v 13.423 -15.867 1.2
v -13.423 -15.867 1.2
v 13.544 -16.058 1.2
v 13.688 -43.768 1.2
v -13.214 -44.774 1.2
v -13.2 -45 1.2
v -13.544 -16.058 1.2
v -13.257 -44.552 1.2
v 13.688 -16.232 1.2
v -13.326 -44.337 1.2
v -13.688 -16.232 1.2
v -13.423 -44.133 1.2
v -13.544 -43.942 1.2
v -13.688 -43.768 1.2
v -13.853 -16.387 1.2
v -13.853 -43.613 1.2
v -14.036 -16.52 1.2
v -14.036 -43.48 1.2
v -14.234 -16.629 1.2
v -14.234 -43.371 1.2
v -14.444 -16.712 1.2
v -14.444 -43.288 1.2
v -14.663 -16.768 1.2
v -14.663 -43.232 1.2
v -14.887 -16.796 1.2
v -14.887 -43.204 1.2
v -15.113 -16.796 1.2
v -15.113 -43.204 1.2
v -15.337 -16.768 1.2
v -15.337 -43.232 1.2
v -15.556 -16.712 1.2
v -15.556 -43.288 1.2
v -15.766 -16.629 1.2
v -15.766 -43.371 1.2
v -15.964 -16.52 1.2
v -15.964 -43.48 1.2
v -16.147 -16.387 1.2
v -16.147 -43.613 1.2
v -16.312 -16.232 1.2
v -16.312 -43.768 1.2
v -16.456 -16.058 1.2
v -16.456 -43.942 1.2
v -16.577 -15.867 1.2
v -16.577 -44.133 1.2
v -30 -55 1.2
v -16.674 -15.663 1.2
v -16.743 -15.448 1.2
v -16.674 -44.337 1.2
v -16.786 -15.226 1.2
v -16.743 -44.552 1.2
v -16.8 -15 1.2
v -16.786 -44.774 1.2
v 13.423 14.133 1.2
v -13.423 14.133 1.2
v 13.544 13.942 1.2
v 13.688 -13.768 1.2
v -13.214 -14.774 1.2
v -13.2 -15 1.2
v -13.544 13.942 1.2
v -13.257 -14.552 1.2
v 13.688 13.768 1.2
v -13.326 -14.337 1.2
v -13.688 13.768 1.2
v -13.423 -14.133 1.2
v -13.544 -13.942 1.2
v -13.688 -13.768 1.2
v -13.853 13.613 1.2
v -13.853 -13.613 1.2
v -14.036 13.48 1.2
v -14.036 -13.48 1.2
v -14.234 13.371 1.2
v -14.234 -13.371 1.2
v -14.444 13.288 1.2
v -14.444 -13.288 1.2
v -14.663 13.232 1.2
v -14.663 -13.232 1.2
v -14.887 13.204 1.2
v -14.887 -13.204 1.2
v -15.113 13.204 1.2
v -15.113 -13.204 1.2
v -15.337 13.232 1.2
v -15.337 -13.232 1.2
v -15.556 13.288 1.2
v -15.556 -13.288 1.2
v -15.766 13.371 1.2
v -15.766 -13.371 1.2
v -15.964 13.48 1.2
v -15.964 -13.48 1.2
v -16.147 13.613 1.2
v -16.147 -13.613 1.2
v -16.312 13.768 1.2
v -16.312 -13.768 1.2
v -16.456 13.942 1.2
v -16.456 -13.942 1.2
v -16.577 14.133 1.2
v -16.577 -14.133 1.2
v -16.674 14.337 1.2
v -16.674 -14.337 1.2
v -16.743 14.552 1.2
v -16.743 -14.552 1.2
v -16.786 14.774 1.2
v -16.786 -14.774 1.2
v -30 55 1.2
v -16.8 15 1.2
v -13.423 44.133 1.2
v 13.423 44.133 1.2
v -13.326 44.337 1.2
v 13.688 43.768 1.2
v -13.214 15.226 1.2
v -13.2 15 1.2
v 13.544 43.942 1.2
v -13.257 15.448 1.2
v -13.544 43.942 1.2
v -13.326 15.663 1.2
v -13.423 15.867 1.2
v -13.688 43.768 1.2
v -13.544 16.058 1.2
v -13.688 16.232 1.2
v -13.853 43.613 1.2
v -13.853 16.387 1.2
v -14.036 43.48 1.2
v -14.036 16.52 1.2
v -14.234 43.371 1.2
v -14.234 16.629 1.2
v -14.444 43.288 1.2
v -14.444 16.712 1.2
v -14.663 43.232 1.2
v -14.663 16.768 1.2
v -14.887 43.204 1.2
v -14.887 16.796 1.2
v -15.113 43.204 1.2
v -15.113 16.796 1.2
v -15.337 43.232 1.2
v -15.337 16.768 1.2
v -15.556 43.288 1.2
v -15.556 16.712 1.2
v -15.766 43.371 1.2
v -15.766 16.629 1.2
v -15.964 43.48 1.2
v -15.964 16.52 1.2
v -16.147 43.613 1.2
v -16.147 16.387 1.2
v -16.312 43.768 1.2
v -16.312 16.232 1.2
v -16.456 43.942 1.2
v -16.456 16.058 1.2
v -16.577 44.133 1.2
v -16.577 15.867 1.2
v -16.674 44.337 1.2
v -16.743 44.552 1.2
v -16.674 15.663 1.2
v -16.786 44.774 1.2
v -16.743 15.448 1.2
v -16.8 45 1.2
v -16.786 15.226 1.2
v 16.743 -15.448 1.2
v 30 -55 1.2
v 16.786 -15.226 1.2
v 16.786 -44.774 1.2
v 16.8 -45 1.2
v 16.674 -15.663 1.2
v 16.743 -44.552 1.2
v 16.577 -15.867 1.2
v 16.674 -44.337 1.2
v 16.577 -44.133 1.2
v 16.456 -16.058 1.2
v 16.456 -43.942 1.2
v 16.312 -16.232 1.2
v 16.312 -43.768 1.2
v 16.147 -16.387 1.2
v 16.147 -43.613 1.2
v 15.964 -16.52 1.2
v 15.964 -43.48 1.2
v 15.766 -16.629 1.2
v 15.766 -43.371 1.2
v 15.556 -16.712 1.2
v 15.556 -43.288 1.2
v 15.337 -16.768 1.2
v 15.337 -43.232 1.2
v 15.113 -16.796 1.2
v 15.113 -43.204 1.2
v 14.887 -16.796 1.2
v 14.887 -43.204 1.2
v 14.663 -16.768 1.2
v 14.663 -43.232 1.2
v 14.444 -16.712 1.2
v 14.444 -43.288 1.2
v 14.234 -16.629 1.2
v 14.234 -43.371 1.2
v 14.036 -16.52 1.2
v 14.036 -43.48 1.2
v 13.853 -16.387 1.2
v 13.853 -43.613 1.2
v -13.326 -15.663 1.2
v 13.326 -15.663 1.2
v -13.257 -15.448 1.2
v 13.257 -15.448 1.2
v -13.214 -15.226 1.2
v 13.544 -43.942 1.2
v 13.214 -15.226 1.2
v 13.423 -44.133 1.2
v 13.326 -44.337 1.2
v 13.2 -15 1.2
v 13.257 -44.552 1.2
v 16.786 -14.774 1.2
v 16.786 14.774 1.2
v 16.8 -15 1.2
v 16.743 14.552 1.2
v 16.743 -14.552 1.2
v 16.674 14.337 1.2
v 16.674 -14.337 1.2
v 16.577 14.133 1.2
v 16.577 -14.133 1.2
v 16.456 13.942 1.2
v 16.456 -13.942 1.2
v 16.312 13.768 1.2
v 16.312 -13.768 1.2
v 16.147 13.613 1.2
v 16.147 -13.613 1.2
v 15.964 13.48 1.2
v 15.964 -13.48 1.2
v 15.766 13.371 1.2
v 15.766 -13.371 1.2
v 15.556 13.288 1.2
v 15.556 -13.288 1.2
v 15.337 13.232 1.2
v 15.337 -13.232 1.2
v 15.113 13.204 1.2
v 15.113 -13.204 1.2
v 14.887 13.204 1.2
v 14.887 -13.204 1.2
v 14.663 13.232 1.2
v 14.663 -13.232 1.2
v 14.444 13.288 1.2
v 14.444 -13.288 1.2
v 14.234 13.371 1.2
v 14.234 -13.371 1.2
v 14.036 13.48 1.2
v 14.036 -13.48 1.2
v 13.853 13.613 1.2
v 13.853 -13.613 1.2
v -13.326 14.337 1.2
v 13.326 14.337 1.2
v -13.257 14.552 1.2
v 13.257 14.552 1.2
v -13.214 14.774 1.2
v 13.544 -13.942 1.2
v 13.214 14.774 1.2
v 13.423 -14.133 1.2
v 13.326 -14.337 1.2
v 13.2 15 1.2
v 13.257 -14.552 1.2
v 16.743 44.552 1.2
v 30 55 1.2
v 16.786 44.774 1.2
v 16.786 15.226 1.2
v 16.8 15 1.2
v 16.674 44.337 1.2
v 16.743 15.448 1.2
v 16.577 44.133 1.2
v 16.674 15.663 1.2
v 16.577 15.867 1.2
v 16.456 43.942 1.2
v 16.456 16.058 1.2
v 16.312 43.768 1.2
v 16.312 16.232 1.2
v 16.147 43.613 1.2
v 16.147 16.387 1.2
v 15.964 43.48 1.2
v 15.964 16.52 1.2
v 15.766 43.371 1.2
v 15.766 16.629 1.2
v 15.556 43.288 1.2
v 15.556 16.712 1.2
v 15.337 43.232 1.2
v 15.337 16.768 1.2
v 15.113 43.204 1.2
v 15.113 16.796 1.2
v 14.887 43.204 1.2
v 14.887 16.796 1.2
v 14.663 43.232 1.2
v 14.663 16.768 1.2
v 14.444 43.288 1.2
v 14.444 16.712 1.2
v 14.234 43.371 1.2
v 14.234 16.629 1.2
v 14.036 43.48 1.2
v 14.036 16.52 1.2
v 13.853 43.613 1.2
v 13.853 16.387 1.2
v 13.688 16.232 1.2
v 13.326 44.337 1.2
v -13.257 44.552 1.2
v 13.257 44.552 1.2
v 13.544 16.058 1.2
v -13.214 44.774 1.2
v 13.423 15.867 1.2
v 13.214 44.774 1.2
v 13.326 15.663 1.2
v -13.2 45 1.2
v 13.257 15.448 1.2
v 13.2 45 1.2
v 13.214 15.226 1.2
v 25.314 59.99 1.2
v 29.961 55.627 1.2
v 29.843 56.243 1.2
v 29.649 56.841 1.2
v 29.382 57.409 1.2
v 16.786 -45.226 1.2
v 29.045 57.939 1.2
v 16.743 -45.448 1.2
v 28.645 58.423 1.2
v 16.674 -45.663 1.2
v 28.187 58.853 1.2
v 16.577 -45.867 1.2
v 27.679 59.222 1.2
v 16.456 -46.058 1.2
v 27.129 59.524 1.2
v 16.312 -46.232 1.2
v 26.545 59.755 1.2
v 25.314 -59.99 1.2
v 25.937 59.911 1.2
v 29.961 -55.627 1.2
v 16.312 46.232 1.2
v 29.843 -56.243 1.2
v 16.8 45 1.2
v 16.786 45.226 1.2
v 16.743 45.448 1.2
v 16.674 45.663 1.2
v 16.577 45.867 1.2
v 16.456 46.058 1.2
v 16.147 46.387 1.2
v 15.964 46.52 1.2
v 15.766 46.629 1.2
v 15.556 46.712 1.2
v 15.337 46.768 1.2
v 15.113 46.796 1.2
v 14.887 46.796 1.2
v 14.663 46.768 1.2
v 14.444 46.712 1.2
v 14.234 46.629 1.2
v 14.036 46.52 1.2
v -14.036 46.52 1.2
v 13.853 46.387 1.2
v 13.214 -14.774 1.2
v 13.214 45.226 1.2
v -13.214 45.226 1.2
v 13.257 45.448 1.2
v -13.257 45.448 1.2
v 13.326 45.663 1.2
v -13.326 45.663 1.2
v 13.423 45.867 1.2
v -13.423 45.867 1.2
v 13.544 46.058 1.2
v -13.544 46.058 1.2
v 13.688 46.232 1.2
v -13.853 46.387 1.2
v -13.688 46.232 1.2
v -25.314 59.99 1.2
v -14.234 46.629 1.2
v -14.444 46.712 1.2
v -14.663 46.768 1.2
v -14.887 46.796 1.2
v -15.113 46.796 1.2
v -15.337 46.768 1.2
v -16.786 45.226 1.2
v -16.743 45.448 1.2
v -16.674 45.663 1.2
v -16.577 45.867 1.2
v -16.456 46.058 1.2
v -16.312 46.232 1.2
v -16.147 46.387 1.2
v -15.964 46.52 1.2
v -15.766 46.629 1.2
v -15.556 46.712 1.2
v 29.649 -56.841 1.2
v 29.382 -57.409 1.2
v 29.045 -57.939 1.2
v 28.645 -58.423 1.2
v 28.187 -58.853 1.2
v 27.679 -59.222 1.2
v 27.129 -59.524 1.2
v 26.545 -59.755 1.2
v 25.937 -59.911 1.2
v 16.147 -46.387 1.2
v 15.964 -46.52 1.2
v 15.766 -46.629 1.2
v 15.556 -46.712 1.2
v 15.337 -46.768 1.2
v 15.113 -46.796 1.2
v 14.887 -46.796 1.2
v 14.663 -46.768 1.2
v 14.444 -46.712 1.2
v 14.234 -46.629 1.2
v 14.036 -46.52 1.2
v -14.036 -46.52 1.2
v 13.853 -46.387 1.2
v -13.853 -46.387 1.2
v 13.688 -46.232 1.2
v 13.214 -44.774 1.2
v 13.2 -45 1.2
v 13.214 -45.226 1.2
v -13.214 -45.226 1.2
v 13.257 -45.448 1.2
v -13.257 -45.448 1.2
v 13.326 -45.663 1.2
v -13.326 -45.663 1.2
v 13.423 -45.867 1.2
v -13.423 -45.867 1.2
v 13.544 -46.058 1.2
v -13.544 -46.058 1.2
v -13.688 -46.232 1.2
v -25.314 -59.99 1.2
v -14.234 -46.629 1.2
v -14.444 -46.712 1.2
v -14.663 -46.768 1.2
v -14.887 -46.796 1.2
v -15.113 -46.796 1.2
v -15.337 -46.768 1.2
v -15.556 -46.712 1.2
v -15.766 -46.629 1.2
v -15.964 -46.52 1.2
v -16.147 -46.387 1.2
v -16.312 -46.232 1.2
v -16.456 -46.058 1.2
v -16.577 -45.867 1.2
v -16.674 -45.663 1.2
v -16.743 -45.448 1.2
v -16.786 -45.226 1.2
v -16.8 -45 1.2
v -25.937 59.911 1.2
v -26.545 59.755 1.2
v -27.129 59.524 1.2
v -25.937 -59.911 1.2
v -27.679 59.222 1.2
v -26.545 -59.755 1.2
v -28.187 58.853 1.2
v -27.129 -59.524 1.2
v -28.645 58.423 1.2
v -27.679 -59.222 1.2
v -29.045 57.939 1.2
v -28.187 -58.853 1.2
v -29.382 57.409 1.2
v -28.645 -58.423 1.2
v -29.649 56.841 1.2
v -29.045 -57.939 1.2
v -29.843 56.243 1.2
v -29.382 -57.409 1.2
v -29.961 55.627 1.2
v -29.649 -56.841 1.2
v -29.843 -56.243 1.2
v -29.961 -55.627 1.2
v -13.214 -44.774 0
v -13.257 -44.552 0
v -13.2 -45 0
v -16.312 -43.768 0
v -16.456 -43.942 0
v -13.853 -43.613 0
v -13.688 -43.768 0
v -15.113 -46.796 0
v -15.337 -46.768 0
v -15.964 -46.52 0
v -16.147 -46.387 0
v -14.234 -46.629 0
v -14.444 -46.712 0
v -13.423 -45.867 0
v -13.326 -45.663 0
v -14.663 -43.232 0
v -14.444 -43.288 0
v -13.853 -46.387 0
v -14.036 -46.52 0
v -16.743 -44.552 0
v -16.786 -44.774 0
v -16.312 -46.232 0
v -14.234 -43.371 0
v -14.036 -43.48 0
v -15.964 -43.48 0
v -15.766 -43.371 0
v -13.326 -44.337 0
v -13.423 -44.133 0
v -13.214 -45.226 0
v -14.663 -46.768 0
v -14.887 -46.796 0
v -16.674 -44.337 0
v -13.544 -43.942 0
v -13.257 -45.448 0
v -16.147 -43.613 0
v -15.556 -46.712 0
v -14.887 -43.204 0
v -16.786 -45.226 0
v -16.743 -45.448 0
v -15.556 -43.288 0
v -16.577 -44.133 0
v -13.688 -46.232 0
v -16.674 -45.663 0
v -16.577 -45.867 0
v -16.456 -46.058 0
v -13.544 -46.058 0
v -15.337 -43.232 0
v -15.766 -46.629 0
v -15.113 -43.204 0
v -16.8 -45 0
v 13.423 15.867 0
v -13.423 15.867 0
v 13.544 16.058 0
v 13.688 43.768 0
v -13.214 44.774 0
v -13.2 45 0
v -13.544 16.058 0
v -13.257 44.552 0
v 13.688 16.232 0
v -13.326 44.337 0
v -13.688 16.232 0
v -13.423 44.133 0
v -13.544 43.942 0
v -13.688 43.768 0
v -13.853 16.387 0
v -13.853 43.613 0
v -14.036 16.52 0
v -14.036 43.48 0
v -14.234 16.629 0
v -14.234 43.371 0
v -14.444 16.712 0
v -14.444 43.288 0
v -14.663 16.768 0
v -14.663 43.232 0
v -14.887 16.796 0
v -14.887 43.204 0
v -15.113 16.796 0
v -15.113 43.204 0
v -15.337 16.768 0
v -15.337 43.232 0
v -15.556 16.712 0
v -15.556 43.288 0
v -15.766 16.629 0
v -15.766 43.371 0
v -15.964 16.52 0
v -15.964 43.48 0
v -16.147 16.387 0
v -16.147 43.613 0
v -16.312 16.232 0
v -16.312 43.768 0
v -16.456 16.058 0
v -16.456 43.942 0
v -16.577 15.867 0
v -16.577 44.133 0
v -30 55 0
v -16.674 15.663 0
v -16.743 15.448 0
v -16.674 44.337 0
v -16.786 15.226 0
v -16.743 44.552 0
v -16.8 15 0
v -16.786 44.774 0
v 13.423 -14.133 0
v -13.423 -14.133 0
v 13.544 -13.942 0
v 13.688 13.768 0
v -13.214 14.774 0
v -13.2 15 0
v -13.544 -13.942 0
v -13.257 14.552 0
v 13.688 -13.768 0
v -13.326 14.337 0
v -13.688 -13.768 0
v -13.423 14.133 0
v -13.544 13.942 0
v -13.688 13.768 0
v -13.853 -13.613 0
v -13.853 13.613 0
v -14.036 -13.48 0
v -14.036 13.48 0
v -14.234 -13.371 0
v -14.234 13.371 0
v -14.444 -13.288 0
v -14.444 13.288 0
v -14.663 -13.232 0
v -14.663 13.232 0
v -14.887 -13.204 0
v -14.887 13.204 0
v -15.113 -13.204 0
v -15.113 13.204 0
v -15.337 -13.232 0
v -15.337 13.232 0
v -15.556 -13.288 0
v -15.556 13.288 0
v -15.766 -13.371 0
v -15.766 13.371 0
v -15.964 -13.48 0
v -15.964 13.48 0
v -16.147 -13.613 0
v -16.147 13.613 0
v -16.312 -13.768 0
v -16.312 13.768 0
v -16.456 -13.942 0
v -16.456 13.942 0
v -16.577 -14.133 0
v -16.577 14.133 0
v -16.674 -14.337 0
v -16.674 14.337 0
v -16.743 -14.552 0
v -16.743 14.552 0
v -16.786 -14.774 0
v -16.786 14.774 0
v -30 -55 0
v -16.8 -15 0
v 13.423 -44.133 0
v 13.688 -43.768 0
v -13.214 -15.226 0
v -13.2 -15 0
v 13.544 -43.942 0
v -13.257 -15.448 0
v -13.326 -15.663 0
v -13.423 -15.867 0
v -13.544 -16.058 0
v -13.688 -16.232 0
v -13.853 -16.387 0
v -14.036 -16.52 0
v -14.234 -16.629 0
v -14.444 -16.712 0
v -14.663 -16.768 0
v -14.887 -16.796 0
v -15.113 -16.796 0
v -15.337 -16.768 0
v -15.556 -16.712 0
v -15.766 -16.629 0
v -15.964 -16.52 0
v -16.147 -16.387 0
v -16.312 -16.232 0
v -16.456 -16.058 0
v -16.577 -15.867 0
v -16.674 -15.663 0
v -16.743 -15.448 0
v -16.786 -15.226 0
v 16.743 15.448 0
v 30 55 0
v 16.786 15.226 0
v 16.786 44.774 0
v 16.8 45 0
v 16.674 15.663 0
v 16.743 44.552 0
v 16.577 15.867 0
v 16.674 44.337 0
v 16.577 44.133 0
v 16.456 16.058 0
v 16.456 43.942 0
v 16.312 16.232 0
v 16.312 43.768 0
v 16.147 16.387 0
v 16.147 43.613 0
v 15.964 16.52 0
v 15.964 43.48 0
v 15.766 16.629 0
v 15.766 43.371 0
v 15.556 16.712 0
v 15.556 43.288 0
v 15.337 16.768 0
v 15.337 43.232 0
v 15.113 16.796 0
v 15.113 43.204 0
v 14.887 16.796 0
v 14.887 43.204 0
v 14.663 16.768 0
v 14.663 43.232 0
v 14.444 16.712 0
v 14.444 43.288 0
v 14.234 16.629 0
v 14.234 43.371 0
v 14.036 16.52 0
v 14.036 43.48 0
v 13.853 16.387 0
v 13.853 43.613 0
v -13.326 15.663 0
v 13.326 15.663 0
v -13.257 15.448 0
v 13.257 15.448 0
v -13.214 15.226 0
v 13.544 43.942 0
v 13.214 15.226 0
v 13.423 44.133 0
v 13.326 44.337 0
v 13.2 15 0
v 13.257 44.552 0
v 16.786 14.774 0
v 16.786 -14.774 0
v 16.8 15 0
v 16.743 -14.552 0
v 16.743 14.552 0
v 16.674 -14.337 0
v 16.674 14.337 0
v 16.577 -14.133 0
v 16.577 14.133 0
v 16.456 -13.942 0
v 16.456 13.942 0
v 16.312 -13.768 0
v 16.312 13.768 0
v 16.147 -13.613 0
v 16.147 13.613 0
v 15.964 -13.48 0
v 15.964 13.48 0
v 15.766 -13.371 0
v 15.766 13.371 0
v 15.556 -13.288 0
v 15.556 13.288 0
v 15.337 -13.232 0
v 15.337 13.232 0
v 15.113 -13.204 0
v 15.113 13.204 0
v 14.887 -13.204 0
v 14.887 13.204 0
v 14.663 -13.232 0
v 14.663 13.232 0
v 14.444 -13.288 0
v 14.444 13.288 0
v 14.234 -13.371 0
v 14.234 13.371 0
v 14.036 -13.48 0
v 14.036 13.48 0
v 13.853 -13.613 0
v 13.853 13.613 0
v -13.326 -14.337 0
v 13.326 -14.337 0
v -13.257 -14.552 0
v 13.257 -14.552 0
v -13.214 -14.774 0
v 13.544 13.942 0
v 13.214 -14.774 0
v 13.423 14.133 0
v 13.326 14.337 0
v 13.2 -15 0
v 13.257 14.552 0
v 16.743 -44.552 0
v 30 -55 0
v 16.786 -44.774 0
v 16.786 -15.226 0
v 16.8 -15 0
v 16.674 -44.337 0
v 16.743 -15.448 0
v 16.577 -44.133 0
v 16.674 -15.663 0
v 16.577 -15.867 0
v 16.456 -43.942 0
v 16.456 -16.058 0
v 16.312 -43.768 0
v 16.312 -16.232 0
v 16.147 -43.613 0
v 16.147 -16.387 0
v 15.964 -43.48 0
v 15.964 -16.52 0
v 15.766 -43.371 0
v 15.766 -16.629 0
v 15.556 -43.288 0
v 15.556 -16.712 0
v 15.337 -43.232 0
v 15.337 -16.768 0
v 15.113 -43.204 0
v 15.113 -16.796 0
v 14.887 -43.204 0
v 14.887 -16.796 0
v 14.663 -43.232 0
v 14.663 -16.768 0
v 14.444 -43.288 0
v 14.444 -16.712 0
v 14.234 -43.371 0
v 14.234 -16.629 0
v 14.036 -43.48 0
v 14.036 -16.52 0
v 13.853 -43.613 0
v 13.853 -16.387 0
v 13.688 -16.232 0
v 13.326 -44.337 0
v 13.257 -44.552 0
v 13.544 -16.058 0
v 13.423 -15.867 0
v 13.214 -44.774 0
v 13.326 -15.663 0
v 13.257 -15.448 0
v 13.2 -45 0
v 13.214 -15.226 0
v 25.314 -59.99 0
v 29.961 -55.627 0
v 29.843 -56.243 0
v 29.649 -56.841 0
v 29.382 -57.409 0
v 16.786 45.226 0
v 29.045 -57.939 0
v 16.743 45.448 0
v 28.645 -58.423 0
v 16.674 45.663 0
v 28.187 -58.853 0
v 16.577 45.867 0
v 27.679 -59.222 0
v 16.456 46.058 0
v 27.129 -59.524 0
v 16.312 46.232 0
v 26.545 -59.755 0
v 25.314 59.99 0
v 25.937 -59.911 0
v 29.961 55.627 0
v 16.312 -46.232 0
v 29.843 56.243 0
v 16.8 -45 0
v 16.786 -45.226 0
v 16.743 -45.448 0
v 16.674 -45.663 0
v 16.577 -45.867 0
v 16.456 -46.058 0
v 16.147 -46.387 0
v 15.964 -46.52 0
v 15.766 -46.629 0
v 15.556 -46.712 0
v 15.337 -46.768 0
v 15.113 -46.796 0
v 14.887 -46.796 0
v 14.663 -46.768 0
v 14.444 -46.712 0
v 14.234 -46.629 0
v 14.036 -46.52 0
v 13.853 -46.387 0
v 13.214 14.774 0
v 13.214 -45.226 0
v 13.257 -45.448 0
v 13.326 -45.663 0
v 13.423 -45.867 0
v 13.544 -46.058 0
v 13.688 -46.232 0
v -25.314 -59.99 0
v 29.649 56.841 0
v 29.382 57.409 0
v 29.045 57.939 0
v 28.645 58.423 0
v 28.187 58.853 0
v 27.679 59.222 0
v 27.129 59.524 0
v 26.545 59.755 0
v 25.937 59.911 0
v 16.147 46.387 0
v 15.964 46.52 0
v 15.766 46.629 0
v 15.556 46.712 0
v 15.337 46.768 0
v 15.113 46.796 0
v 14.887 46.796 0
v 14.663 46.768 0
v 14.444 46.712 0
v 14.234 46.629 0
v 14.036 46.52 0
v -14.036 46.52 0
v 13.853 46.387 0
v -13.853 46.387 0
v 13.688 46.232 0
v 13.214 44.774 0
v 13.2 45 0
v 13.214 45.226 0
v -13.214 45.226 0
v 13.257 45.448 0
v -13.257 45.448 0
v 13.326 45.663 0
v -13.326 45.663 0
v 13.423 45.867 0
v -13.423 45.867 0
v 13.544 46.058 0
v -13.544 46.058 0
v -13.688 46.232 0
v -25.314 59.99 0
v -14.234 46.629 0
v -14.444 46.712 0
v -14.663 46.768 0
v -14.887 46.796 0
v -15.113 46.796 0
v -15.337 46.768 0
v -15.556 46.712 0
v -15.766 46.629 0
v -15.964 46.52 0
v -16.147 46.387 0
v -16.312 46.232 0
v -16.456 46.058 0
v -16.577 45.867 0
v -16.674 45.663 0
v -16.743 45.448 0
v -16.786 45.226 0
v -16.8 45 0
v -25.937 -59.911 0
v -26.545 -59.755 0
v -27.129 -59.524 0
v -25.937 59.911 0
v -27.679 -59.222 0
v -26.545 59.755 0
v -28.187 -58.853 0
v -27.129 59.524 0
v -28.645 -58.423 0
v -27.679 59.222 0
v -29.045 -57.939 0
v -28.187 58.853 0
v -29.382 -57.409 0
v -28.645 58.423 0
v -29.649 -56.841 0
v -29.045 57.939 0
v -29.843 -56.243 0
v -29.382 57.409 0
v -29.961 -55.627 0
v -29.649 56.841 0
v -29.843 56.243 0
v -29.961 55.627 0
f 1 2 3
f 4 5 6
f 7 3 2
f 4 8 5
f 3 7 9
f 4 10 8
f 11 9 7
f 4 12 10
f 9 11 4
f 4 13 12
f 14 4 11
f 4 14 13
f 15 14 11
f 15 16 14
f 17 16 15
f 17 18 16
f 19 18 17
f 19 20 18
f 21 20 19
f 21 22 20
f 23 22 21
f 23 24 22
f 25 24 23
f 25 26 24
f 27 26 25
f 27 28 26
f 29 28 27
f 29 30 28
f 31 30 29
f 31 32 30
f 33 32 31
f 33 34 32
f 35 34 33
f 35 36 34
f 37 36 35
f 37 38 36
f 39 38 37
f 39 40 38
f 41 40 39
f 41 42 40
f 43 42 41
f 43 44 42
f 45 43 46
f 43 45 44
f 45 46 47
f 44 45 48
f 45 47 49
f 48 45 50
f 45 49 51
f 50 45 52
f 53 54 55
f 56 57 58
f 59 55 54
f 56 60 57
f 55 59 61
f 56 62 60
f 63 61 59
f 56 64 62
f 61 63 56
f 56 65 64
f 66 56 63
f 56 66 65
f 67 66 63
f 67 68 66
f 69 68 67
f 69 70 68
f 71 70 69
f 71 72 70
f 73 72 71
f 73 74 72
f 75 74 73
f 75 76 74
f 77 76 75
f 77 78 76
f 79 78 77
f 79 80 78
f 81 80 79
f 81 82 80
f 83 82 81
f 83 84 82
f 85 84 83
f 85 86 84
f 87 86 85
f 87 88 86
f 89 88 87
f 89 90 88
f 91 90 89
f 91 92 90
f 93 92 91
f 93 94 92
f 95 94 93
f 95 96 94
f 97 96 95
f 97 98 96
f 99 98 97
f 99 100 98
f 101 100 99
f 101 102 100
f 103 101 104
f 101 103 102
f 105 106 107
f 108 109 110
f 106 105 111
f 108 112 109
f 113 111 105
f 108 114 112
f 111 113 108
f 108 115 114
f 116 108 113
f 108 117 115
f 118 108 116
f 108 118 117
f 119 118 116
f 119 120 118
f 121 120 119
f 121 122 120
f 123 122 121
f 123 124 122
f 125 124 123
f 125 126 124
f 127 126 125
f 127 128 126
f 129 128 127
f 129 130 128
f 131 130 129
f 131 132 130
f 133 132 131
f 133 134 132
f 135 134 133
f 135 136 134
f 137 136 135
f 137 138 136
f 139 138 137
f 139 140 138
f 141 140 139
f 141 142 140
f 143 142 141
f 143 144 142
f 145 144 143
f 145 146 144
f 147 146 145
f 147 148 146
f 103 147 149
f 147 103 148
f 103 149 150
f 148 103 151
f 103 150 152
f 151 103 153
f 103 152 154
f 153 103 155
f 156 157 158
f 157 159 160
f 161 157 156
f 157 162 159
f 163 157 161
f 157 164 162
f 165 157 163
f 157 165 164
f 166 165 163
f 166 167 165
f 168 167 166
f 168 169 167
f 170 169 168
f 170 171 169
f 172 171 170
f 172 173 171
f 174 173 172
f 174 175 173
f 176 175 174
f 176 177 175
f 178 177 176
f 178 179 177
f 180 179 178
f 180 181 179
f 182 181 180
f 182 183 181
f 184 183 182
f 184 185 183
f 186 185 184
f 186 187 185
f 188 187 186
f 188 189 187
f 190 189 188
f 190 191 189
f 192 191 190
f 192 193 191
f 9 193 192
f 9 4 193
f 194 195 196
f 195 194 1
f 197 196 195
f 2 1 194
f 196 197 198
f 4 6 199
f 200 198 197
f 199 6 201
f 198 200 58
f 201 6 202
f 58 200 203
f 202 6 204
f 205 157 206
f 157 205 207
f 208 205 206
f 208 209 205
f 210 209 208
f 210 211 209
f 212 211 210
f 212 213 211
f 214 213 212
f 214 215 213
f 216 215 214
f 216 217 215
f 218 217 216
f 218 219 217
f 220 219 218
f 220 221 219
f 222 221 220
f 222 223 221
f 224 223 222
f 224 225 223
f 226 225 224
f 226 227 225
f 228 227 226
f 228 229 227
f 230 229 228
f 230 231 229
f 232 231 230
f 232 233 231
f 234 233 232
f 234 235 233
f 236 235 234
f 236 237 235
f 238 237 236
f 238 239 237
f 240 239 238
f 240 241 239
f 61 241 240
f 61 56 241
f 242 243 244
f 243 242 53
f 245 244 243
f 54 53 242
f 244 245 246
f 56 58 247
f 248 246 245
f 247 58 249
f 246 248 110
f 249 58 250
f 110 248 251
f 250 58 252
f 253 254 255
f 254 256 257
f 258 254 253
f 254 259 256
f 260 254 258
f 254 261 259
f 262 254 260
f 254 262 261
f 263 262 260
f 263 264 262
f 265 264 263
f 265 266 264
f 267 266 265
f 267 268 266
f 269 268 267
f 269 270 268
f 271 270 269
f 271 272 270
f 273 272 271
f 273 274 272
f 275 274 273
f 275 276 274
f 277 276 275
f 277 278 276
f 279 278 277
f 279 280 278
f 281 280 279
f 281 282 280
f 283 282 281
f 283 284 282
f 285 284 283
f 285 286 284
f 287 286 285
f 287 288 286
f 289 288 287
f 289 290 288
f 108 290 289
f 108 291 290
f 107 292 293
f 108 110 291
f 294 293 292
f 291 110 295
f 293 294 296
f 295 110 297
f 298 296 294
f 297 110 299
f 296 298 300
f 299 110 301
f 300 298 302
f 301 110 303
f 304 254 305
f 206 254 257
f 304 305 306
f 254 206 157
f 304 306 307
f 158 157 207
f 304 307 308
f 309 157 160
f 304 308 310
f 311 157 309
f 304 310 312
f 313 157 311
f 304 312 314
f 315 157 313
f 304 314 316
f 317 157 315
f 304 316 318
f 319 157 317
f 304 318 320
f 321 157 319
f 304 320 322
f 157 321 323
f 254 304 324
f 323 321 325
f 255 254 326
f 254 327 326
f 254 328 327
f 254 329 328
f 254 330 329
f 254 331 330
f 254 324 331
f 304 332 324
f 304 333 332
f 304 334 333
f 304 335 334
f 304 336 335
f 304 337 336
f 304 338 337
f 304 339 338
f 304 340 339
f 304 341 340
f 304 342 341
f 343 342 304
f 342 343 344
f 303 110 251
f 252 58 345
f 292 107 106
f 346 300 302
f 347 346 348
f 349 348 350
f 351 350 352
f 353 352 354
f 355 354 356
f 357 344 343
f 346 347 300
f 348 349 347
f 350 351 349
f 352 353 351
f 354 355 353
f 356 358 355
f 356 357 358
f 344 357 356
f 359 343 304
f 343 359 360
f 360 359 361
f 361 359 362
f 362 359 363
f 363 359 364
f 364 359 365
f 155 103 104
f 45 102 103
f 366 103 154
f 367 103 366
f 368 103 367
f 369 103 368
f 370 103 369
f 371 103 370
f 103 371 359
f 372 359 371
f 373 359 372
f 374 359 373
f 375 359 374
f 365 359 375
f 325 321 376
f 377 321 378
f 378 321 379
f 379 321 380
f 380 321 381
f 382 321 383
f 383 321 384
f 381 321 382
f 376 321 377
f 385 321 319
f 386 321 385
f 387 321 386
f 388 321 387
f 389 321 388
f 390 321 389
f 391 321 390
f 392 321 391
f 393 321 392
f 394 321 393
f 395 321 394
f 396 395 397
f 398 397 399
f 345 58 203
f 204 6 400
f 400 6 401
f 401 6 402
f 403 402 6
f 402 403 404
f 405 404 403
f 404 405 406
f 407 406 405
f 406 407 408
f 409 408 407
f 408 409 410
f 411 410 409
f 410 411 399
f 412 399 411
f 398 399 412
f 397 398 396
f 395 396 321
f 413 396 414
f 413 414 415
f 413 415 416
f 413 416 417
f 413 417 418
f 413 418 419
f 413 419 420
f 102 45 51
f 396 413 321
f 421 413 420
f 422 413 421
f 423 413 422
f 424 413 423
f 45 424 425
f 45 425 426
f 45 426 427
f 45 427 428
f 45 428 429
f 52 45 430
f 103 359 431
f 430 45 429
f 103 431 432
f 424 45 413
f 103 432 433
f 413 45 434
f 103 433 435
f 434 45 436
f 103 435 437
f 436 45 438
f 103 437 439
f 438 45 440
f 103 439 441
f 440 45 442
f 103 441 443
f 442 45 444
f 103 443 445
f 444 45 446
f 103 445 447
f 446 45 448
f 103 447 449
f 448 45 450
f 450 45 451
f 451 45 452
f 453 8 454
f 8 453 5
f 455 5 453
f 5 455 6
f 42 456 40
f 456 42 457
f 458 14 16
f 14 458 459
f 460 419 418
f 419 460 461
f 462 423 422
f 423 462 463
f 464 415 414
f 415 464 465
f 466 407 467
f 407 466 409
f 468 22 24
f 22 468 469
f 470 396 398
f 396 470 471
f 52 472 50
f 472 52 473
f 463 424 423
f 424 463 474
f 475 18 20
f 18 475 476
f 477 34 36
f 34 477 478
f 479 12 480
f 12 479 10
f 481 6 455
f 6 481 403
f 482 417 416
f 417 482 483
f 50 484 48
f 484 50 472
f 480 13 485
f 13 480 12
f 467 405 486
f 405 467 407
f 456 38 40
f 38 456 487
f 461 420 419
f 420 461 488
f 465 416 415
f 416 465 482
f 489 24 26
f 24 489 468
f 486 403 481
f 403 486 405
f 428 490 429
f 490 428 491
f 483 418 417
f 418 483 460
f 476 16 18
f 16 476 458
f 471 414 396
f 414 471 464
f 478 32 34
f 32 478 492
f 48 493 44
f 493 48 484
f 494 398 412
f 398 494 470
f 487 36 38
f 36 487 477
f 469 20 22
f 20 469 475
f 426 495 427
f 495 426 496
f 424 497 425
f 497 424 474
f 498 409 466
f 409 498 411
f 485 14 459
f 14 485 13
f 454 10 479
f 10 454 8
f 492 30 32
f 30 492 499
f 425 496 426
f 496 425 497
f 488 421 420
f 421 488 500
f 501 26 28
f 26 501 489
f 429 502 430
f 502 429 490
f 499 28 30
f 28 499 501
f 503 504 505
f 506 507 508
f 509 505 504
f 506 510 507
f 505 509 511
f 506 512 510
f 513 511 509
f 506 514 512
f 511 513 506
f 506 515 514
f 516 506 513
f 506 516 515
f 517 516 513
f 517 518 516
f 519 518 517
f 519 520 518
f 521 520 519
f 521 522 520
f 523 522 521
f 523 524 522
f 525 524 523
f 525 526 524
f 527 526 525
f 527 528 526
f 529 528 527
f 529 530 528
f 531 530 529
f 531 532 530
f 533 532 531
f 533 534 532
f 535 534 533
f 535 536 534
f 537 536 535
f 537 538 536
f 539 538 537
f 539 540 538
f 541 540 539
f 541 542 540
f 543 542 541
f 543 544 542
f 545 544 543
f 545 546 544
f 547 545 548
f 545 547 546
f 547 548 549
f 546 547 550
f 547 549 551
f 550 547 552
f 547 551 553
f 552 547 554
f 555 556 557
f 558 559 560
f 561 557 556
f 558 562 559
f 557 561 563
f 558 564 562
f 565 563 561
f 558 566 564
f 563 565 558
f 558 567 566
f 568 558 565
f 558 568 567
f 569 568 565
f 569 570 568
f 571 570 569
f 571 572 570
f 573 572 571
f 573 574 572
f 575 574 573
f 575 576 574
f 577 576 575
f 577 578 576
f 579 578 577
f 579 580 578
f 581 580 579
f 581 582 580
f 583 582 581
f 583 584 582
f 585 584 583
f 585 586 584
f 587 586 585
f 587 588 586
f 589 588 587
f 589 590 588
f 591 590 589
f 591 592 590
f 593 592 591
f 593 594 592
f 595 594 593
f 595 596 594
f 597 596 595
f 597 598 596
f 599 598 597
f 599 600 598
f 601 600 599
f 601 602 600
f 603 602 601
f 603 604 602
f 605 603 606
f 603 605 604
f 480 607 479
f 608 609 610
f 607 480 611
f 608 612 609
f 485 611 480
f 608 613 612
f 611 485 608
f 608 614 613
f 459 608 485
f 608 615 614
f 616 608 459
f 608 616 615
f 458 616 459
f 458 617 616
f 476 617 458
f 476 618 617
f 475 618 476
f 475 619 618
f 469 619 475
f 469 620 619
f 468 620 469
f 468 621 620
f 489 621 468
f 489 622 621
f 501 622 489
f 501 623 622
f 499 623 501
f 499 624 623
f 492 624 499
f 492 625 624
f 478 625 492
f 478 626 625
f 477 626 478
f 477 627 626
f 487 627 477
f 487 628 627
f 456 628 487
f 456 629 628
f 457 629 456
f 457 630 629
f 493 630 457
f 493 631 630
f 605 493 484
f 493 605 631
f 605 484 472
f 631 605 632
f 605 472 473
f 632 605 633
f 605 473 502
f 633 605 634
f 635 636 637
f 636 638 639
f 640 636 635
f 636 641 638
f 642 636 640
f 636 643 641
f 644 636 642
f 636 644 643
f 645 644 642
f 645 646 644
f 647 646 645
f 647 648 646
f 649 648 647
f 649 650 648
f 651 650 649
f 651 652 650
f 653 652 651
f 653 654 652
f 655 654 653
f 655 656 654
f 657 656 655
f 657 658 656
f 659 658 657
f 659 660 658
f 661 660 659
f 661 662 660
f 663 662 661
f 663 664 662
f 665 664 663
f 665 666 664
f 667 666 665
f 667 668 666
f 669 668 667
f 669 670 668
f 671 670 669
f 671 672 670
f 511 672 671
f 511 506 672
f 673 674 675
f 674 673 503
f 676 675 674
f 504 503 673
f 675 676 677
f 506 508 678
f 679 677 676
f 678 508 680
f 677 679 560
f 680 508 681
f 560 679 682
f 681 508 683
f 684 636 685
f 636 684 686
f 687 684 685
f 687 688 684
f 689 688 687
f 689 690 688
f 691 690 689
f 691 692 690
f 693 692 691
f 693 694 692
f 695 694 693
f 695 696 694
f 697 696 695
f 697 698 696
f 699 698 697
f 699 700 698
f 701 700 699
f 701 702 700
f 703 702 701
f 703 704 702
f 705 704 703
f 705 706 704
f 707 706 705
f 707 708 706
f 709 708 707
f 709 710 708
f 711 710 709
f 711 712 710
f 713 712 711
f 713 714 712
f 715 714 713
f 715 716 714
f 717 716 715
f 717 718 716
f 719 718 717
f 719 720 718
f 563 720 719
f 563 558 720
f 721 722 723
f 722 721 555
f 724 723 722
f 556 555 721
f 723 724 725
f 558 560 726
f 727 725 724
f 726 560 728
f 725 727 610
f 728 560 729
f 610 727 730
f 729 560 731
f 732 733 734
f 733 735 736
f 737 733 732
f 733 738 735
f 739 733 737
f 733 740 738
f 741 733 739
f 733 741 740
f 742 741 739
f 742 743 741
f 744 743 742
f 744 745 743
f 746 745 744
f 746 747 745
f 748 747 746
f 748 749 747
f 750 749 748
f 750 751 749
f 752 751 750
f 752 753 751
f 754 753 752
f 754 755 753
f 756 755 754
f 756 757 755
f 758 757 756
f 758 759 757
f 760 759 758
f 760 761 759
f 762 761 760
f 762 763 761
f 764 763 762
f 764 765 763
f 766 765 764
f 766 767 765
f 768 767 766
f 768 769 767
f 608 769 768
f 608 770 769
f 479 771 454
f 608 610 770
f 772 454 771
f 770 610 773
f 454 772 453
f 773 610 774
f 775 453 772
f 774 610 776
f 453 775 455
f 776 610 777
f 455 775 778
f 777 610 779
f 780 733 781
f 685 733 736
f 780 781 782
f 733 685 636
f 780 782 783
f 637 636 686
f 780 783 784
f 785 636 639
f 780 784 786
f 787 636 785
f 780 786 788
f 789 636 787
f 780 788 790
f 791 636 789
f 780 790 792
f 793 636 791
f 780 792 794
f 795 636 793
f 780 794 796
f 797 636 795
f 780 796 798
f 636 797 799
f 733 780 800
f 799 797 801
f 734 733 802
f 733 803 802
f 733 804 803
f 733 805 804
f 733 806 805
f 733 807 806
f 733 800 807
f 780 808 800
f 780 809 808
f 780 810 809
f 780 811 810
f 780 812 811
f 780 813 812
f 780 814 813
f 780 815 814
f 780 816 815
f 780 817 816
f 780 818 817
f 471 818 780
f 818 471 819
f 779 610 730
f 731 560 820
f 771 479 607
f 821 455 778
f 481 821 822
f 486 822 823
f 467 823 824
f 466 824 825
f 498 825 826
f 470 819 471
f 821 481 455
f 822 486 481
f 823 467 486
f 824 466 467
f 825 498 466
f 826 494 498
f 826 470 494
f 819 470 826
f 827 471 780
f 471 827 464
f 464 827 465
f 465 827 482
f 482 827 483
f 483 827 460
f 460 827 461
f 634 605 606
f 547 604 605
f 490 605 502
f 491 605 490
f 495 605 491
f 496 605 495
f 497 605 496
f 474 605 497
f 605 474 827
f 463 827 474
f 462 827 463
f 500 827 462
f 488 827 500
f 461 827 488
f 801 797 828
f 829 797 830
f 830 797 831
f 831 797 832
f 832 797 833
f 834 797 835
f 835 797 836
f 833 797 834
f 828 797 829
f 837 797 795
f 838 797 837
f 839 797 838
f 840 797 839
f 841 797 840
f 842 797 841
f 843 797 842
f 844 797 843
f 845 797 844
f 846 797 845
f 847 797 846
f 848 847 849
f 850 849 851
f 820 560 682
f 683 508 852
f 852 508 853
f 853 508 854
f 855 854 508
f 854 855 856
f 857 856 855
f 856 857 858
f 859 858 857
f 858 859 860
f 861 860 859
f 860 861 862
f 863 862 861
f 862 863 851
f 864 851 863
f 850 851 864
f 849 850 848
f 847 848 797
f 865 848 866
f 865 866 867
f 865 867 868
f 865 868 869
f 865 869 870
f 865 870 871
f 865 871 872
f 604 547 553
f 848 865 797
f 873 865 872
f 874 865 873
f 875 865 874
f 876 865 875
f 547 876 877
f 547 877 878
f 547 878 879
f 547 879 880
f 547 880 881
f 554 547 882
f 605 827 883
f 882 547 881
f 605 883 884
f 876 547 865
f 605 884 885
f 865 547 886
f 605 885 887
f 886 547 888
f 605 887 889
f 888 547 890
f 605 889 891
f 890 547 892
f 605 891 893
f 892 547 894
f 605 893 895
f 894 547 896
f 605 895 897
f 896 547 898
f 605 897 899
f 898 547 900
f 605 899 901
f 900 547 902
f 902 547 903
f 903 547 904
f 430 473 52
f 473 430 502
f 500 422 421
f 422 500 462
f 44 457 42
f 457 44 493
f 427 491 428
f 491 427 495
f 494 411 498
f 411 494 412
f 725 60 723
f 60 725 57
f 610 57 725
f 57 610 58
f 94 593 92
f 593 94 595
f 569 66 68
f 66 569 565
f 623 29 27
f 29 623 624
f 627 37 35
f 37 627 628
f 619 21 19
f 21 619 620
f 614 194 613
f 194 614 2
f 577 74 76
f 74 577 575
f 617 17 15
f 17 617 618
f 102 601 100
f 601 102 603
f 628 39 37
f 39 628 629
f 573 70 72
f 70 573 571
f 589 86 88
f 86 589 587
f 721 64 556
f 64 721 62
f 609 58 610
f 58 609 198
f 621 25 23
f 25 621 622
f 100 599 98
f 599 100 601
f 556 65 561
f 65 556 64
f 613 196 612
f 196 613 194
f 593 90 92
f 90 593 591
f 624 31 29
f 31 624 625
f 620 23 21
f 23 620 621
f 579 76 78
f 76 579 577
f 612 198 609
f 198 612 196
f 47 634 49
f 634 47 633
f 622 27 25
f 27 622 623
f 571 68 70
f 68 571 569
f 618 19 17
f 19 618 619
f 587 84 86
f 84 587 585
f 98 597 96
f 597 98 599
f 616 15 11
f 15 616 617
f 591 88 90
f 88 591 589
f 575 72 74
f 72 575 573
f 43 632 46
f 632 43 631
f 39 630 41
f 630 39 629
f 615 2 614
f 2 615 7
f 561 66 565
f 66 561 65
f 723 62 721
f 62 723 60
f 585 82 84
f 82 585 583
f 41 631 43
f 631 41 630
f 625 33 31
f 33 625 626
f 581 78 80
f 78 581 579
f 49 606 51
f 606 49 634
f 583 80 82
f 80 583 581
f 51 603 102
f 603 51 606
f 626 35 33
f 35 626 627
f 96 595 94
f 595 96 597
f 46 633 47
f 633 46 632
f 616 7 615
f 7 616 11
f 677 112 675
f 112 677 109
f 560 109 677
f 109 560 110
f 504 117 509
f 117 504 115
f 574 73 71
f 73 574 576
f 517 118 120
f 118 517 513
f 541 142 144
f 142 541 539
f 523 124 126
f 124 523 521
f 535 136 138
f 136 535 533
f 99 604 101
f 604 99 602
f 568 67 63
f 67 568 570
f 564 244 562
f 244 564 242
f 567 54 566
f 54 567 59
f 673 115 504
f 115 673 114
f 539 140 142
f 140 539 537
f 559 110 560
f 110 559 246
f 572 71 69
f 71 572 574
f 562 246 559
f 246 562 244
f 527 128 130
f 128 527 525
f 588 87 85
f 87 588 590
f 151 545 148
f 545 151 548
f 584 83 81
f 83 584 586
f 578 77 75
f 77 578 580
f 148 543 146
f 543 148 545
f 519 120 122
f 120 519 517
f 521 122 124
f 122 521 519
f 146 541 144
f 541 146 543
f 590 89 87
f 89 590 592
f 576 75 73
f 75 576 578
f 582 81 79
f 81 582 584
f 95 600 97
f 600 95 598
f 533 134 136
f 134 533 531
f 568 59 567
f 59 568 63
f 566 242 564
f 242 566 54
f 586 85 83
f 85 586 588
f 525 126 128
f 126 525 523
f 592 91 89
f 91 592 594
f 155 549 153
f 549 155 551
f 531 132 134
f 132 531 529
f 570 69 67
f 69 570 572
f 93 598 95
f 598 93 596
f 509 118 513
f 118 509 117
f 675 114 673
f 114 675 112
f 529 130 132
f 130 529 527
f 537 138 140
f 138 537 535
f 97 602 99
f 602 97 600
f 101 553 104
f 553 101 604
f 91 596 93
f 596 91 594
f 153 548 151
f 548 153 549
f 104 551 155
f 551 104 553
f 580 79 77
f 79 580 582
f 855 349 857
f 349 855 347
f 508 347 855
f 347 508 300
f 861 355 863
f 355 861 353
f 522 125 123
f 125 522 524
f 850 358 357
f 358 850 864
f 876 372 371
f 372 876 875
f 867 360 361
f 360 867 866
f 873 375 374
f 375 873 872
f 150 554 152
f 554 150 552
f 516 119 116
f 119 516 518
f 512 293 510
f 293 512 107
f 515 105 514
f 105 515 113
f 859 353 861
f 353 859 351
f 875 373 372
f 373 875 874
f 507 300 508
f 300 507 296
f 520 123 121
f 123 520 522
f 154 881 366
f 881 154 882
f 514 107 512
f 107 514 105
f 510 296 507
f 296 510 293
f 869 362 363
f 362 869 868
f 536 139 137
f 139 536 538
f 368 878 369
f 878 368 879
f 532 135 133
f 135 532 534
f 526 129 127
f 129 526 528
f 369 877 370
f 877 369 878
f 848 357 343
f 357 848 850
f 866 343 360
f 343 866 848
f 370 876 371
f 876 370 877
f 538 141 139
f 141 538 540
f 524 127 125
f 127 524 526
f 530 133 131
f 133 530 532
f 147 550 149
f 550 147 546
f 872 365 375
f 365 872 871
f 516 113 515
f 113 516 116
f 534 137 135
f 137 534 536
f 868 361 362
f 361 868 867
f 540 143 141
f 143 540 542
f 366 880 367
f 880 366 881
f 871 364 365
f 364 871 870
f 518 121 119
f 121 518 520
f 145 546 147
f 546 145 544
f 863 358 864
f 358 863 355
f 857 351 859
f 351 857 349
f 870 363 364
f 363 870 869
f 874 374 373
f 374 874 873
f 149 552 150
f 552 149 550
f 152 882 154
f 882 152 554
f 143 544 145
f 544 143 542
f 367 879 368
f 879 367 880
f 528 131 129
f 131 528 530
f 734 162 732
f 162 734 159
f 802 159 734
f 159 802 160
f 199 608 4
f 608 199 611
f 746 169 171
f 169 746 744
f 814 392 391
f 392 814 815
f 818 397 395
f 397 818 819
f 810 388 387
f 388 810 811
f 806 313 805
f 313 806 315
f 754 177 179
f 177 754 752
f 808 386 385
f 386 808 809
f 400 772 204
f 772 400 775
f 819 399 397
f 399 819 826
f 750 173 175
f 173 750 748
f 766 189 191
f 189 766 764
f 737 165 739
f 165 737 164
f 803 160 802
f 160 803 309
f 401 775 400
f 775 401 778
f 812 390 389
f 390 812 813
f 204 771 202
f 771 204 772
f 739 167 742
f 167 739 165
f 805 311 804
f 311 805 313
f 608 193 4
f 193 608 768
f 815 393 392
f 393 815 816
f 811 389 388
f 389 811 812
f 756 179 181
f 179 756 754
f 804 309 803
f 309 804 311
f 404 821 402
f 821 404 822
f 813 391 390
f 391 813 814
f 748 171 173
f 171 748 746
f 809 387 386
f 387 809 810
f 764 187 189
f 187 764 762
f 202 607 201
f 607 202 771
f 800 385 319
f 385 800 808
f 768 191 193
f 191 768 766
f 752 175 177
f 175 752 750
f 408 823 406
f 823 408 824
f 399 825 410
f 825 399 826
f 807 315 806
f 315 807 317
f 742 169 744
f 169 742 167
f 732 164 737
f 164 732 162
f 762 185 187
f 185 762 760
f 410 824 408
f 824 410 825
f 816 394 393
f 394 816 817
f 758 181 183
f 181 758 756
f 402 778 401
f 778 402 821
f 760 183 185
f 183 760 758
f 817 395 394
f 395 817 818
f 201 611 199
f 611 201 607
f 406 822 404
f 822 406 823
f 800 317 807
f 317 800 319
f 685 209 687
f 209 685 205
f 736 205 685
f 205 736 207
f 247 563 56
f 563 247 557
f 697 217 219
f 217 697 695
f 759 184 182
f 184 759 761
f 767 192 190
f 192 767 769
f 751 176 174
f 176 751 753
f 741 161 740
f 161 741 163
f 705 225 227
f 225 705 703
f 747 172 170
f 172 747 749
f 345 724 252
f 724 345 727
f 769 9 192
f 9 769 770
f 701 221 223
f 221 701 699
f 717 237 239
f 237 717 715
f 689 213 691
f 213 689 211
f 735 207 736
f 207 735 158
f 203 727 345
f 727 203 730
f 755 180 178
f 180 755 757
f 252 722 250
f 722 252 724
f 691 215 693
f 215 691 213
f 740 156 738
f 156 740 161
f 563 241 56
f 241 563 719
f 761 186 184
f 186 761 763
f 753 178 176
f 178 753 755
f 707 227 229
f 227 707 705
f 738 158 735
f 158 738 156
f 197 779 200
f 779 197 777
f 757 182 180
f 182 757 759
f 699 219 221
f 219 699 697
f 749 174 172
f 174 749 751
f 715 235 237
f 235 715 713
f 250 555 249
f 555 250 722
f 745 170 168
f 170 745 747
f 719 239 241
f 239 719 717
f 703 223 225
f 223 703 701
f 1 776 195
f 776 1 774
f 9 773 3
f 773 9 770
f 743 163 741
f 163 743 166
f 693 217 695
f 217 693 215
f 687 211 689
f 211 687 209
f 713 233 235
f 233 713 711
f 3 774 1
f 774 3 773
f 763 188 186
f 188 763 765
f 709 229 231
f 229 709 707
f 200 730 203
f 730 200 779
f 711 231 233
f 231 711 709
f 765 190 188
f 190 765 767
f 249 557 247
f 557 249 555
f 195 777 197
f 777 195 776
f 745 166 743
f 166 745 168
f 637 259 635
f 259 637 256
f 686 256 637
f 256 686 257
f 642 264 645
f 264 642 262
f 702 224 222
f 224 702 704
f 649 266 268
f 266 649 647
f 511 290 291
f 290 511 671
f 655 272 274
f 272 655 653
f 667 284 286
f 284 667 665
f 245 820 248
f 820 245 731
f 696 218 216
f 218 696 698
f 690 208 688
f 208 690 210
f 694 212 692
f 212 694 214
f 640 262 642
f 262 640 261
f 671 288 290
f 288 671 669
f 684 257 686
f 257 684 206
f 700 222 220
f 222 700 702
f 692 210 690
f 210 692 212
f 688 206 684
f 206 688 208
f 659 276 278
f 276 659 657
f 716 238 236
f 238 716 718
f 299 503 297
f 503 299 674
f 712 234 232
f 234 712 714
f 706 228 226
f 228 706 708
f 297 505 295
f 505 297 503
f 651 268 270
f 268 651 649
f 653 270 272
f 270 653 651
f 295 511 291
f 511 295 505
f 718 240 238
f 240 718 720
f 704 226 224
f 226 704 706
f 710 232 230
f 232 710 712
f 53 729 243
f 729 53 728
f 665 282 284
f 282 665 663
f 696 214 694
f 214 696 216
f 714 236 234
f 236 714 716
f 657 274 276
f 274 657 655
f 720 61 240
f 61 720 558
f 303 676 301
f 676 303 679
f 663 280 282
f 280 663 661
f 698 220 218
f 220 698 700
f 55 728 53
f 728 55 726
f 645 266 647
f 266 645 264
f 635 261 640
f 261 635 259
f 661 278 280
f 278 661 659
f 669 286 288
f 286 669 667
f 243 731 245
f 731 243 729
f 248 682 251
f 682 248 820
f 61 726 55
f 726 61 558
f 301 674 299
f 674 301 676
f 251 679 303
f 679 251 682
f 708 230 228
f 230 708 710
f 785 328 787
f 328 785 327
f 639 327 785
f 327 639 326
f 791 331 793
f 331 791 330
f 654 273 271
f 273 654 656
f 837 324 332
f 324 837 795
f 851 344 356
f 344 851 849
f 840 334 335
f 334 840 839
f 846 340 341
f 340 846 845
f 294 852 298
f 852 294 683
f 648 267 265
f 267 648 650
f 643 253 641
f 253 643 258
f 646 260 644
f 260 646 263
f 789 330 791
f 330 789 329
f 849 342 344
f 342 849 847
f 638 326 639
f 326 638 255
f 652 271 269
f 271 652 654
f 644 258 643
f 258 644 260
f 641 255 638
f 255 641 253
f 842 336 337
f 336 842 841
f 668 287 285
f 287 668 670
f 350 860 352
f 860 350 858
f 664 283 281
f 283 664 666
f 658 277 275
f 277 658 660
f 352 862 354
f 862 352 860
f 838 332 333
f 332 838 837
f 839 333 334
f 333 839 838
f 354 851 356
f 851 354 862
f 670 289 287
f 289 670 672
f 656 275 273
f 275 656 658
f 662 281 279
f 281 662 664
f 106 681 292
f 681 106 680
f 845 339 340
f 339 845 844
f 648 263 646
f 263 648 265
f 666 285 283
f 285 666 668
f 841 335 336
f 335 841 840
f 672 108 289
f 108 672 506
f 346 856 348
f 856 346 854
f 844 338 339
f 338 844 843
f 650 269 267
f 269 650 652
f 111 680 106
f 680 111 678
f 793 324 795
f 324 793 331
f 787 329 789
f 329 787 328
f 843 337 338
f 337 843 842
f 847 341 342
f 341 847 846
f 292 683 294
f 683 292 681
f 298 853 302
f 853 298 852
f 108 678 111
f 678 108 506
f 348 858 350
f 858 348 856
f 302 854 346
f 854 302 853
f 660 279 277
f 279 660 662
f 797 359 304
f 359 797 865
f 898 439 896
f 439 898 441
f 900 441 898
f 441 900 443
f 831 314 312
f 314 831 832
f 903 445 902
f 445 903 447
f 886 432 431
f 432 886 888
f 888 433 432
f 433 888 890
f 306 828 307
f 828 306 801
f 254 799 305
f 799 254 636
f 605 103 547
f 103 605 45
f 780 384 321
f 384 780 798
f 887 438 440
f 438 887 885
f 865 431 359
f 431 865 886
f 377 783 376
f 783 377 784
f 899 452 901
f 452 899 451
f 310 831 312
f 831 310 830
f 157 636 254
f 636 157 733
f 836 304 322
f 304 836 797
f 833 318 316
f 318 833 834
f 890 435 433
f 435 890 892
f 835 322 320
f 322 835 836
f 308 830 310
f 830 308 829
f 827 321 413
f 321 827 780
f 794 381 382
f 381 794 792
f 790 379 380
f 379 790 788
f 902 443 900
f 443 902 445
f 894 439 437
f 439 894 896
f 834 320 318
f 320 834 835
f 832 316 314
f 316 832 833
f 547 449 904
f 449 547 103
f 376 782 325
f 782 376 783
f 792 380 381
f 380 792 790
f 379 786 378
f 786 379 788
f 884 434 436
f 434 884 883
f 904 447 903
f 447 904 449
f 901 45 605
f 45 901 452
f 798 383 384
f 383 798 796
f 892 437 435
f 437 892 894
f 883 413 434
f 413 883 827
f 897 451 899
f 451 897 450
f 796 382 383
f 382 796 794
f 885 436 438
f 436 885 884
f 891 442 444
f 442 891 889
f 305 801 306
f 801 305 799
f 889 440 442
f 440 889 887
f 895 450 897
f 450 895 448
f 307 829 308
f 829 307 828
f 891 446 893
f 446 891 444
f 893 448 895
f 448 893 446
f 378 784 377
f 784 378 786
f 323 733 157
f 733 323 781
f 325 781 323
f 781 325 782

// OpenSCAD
$fn = 50;


difference() {
	union() {
		hull() {
			translate(v = [-25.0000000000, 55.0000000000, 0]) {
				cylinder(h = 45, r = 5);
			}
			translate(v = [25.0000000000, 55.0000000000, 0]) {
				cylinder(h = 45, r = 5);
			}
			translate(v = [-25.0000000000, -55.0000000000, 0]) {
				cylinder(h = 45, r = 5);
			}
			translate(v = [25.0000000000, -55.0000000000, 0]) {
				cylinder(h = 45, r = 5);
			}
		}
	}
	union() {
		translate(v = [0, 0, 1.2000000000]) {
			hull() {
				translate(v = [-25.0000000000, 55.0000000000, 0]) {
					cylinder(h = 43.8000000000, r = 3.8000000000);
				}
				translate(v = [25.0000000000, 55.0000000000, 0]) {
					cylinder(h = 43.8000000000, r = 3.8000000000);
				}
				translate(v = [-25.0000000000, -55.0000000000, 0]) {
					cylinder(h = 43.8000000000, r = 3.8000000000);
				}
				translate(v = [25.0000000000, -55.0000000000, 0]) {
					cylinder(h = 43.8000000000, r = 3.8000000000);
				}
			}
		}
		#translate(v = [-15.0000000000, -45.0000000000, 0]) {
			cylinder(h = 1.2000000000, r = 1.8000000000);
		}
		#translate(v = [-15.0000000000, -15.0000000000, 0]) {
			cylinder(h = 1.2000000000, r = 1.8000000000);
		}
		#translate(v = [-15.0000000000, 15.0000000000, 0]) {
			cylinder(h = 1.2000000000, r = 1.8000000000);
		}
		#translate(v = [-15.0000000000, 45.0000000000, 0]) {
			cylinder(h = 1.2000000000, r = 1.8000000000);
		}
		#translate(v = [15.0000000000, -45.0000000000, 0]) {
			cylinder(h = 1.2000000000, r = 1.8000000000);
		}
		#translate(v = [15.0000000000, -15.0000000000, 0]) {
			cylinder(h = 1.2000000000, r = 1.8000000000);
		}
		#translate(v = [15.0000000000, 15.0000000000, 0]) {
			cylinder(h = 1.2000000000, r = 1.8000000000);
		}
		#translate(v = [15.0000000000, 45.0000000000, 0]) {
			cylinder(h = 1.2000000000, r = 1.8000000000);
		}
		translate(v = [-250.0000000000, -250.0000000000, 1.2000000000]) {
			cube(size = [500, 500, 500]);
		}
		translate(v = [-250.0000000000, -250.0000000000, 1.2000000000]) {
			cube(size = [500, 500, 500]);
		}
		translate(v = [-250.0000000000, -250.0000000000, 1.2000000000]) {
			cube(size = [500, 500, 500]);
		}
	}
}
